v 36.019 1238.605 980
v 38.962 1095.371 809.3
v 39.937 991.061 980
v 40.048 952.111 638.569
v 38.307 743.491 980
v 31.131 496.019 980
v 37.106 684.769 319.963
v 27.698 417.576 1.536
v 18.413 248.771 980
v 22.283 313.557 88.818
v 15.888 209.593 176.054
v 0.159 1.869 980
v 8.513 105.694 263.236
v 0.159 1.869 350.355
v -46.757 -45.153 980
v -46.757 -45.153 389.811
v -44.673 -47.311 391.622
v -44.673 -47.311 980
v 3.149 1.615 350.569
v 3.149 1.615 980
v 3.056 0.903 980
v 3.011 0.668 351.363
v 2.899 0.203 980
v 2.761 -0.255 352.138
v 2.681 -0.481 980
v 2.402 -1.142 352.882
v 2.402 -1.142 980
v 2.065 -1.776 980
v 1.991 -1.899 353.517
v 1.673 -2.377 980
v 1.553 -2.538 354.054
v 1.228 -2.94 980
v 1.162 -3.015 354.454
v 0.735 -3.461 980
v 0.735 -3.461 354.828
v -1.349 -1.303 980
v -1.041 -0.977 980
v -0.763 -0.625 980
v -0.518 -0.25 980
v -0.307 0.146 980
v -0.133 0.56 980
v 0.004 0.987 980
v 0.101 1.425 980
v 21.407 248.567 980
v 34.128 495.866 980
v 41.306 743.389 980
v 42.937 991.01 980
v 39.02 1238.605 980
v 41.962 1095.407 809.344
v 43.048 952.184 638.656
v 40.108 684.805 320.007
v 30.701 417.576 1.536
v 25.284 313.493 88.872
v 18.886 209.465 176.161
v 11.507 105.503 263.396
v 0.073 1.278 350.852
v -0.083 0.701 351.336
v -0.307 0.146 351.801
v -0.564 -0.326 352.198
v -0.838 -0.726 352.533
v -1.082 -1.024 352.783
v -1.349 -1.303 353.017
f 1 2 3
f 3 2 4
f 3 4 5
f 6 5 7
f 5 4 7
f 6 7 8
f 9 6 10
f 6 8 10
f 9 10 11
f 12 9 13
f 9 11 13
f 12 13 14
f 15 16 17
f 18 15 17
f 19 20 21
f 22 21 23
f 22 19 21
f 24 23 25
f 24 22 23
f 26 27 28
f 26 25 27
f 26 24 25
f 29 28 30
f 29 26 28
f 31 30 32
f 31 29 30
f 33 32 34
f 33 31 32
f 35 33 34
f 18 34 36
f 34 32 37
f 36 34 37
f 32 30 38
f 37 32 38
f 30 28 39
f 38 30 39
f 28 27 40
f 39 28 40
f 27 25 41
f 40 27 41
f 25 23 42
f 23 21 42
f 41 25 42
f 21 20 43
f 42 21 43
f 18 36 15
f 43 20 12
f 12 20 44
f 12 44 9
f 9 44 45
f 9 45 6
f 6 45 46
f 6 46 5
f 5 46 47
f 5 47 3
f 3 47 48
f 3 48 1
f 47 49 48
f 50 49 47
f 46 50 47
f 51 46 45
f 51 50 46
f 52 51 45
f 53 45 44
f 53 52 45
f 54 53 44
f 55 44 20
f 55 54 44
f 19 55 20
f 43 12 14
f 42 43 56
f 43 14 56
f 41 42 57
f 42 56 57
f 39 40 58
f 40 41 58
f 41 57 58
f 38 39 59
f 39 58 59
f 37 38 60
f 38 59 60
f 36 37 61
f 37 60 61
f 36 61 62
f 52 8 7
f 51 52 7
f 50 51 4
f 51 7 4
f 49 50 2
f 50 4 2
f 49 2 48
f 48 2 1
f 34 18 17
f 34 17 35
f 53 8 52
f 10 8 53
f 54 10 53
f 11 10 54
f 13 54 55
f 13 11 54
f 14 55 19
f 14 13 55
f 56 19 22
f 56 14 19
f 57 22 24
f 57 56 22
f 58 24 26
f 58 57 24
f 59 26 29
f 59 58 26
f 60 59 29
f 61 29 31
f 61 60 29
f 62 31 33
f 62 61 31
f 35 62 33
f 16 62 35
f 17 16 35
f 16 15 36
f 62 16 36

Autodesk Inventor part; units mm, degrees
ref_plane "YZ Plane" through (0, 0, 0) normal (1, 0, 0) x (0, 1, 0)
ref_plane "XZ Plane" through (0, 0, 0) normal (0, 1, 0) x (-1, 0, 0)
ref_plane "XY Plane" through (0, 0, 0) normal (0, 0, 1) x (1, 0, 0)
sketch "Sketch1" plane through (0, 0, 0) normal (0, 0, 1) x (1, 0, 0)
  line L0 (8972.064376, -2416.982713) -> (8972.064376, -2466.982713) construction
  line L1 (0, 47) -> (0, 0) construction
  arc A0 (0.159434, 1.869277) -> (0, 1880) centre (-11009.945504, 940) ccw
  arc A1 (0, 0) -> (0.159434, 1.869277) centre (-11009.945504, 940) ccw construction
  arc A2 (-1.349222, -1.302929) -> (0.159434, 1.869277) centre (-4.822514, 2.29377) ccw
  line L2 (-1.349222, -1.302929) -> (0, 0) construction
  line L3 (-46.757087, -45.152794) -> (-1.349222, -1.302929)
  line L4 (-41.190716, -50.91694) -> (-46.757087, -45.152794) construction
  line L5 (0, 0) -> (0, 1880) construction
  line L6 (0, 0) -> (1.875639, 0) construction
  dimension "d154" = 5
  dimension "d155" = 65
  dimension "d156" = 11050
  dimension "d157" = 136
  dimension "d158" = 1880
contour flange "Contour Flange2" sketch "Sketch1" thickness 3 bend radius 3 width 980 along (0, 0, 1) mid plane no both sides no wall seen from (-24.053155, -23.227861, 0) lies toward (0.6946584, -0.7193398, 0) curves L3 A2 A0
bend "Bend2"
corner "Corner2"
sketch "Sketch5" plane through (0, 0, 0) normal (1, 0, 0) x (0, 1, 0)
  line L0 (1.614581, 980) -> (1.614581, 0)
  line L1 (1.614581, 0) -> (1880.255204, 0)
  line L2 (1880.255204, 0) -> (1880.255204, 980)
  line L3 (1.614581, 980) -> (1880.255204, 980)
  line L4 (1.614581, 980) -> (1.614581, 0)
  line L5 (-3.460948, 980) -> (1.614581, 980)
  line L6 (-3.460948, 980) -> (-3.460948, 0)
  line L7 (-3.460948, 0) -> (1.614581, 0)
  line L8 (-3.460948, 980) -> (-3.460948, 0)
  line L9 (-47.310813, 980) -> (-3.460948, 980)
  line L10 (-47.310813, 0) -> (-47.310813, 980)
  line L11 (-47.310813, 0) -> (-3.460948, 0)
  line L12 (1238.605204, 0) -> (416.287565, 980)
  line L13 (419.406335, 980) -> (-47.310813, 588.377813)
  line L14 (419.406335, 0) -> (-47.310813, 391.622187)
  line L15 (416.287565, 0) -> (1238.605204, 980)
  point P0 (0, 0)
  point P1 (-3.460948, 0)
  point P2 (1.614581, 0)
  dimension "d161" = 40
  dimension "d162" = 40
  dimension "d163" = 641.65
  dimension "d164" = 641.65
  dimension "d166" = 300
  dimension "d167" = 300
extrude "Extrusion3" cut sketch "Sketch5" along normal through all both and the other way through all contours L14 L15 L1 L0 | L0 L7 L6 L14 | L15 L12 L1 L14 | L14 L1 L15 | L6 L11 L10 L14 | L15 L3 L2 L1 L12
sketch "Sketch8" plane through (-1.349222, -1.302929, 980) normal (-0.6946584, 0.7193398, 0) x (0.7193398, 0.6946584, 0)
  line L0 (-39.124361, 25.740843) -> (-51.124361, 25.740843) construction
  line L1 (-51.124361, 25.740843) -> (-51.124361, 162.747026) construction
  line L2 (-51.124361, 162.747026) -> (-39.124361, 162.747026) construction
  line L3 (-39.124361, 162.747026) -> (-39.124361, 25.740843) construction
  line L4 (-63.124361, 0) -> (-63.124361, 590.188606)
  point P0 (1.875639, 980)
  dimension "d168" = 12
  dimension "d169" = 12
mark "Mark5"
equation "\"d36\" = Thickness"
equation "\"d37\" = BendReliefWidth"
equation "\"d38\" = BendReliefDepth"
equation "\"d39\" = MinimumRemnant"
equation "\"d40\" = TransitionRadius"
equation "\"d42\" = BendRadius"
equation "\"d44\" = CornerReliefSize"
equation "\"d45\" = GapSize"
equation "\"d46\" = JacobiRadiusSize"
equation "\"BendRadius\" = Thickness"
equation "\"BendReliefWidth\" = Thickness"
equation "\"BendReliefDepth\" = 0.5 * Thickness"
equation "\"CornerReliefSize\" = 4 * Thickness"
equation "\"MinimumRemnant\" = 2 * Thickness"
equation "\"TransitionRadius\" = BendRadius"
equation "\"JacobiRadiusSize\" = BendRadius"
equation "\"GapSize\" = Thickness"
equation "\"Thickness\" = 3"
properties part number "MSC 304 sheet right board face" material "AISI304"
